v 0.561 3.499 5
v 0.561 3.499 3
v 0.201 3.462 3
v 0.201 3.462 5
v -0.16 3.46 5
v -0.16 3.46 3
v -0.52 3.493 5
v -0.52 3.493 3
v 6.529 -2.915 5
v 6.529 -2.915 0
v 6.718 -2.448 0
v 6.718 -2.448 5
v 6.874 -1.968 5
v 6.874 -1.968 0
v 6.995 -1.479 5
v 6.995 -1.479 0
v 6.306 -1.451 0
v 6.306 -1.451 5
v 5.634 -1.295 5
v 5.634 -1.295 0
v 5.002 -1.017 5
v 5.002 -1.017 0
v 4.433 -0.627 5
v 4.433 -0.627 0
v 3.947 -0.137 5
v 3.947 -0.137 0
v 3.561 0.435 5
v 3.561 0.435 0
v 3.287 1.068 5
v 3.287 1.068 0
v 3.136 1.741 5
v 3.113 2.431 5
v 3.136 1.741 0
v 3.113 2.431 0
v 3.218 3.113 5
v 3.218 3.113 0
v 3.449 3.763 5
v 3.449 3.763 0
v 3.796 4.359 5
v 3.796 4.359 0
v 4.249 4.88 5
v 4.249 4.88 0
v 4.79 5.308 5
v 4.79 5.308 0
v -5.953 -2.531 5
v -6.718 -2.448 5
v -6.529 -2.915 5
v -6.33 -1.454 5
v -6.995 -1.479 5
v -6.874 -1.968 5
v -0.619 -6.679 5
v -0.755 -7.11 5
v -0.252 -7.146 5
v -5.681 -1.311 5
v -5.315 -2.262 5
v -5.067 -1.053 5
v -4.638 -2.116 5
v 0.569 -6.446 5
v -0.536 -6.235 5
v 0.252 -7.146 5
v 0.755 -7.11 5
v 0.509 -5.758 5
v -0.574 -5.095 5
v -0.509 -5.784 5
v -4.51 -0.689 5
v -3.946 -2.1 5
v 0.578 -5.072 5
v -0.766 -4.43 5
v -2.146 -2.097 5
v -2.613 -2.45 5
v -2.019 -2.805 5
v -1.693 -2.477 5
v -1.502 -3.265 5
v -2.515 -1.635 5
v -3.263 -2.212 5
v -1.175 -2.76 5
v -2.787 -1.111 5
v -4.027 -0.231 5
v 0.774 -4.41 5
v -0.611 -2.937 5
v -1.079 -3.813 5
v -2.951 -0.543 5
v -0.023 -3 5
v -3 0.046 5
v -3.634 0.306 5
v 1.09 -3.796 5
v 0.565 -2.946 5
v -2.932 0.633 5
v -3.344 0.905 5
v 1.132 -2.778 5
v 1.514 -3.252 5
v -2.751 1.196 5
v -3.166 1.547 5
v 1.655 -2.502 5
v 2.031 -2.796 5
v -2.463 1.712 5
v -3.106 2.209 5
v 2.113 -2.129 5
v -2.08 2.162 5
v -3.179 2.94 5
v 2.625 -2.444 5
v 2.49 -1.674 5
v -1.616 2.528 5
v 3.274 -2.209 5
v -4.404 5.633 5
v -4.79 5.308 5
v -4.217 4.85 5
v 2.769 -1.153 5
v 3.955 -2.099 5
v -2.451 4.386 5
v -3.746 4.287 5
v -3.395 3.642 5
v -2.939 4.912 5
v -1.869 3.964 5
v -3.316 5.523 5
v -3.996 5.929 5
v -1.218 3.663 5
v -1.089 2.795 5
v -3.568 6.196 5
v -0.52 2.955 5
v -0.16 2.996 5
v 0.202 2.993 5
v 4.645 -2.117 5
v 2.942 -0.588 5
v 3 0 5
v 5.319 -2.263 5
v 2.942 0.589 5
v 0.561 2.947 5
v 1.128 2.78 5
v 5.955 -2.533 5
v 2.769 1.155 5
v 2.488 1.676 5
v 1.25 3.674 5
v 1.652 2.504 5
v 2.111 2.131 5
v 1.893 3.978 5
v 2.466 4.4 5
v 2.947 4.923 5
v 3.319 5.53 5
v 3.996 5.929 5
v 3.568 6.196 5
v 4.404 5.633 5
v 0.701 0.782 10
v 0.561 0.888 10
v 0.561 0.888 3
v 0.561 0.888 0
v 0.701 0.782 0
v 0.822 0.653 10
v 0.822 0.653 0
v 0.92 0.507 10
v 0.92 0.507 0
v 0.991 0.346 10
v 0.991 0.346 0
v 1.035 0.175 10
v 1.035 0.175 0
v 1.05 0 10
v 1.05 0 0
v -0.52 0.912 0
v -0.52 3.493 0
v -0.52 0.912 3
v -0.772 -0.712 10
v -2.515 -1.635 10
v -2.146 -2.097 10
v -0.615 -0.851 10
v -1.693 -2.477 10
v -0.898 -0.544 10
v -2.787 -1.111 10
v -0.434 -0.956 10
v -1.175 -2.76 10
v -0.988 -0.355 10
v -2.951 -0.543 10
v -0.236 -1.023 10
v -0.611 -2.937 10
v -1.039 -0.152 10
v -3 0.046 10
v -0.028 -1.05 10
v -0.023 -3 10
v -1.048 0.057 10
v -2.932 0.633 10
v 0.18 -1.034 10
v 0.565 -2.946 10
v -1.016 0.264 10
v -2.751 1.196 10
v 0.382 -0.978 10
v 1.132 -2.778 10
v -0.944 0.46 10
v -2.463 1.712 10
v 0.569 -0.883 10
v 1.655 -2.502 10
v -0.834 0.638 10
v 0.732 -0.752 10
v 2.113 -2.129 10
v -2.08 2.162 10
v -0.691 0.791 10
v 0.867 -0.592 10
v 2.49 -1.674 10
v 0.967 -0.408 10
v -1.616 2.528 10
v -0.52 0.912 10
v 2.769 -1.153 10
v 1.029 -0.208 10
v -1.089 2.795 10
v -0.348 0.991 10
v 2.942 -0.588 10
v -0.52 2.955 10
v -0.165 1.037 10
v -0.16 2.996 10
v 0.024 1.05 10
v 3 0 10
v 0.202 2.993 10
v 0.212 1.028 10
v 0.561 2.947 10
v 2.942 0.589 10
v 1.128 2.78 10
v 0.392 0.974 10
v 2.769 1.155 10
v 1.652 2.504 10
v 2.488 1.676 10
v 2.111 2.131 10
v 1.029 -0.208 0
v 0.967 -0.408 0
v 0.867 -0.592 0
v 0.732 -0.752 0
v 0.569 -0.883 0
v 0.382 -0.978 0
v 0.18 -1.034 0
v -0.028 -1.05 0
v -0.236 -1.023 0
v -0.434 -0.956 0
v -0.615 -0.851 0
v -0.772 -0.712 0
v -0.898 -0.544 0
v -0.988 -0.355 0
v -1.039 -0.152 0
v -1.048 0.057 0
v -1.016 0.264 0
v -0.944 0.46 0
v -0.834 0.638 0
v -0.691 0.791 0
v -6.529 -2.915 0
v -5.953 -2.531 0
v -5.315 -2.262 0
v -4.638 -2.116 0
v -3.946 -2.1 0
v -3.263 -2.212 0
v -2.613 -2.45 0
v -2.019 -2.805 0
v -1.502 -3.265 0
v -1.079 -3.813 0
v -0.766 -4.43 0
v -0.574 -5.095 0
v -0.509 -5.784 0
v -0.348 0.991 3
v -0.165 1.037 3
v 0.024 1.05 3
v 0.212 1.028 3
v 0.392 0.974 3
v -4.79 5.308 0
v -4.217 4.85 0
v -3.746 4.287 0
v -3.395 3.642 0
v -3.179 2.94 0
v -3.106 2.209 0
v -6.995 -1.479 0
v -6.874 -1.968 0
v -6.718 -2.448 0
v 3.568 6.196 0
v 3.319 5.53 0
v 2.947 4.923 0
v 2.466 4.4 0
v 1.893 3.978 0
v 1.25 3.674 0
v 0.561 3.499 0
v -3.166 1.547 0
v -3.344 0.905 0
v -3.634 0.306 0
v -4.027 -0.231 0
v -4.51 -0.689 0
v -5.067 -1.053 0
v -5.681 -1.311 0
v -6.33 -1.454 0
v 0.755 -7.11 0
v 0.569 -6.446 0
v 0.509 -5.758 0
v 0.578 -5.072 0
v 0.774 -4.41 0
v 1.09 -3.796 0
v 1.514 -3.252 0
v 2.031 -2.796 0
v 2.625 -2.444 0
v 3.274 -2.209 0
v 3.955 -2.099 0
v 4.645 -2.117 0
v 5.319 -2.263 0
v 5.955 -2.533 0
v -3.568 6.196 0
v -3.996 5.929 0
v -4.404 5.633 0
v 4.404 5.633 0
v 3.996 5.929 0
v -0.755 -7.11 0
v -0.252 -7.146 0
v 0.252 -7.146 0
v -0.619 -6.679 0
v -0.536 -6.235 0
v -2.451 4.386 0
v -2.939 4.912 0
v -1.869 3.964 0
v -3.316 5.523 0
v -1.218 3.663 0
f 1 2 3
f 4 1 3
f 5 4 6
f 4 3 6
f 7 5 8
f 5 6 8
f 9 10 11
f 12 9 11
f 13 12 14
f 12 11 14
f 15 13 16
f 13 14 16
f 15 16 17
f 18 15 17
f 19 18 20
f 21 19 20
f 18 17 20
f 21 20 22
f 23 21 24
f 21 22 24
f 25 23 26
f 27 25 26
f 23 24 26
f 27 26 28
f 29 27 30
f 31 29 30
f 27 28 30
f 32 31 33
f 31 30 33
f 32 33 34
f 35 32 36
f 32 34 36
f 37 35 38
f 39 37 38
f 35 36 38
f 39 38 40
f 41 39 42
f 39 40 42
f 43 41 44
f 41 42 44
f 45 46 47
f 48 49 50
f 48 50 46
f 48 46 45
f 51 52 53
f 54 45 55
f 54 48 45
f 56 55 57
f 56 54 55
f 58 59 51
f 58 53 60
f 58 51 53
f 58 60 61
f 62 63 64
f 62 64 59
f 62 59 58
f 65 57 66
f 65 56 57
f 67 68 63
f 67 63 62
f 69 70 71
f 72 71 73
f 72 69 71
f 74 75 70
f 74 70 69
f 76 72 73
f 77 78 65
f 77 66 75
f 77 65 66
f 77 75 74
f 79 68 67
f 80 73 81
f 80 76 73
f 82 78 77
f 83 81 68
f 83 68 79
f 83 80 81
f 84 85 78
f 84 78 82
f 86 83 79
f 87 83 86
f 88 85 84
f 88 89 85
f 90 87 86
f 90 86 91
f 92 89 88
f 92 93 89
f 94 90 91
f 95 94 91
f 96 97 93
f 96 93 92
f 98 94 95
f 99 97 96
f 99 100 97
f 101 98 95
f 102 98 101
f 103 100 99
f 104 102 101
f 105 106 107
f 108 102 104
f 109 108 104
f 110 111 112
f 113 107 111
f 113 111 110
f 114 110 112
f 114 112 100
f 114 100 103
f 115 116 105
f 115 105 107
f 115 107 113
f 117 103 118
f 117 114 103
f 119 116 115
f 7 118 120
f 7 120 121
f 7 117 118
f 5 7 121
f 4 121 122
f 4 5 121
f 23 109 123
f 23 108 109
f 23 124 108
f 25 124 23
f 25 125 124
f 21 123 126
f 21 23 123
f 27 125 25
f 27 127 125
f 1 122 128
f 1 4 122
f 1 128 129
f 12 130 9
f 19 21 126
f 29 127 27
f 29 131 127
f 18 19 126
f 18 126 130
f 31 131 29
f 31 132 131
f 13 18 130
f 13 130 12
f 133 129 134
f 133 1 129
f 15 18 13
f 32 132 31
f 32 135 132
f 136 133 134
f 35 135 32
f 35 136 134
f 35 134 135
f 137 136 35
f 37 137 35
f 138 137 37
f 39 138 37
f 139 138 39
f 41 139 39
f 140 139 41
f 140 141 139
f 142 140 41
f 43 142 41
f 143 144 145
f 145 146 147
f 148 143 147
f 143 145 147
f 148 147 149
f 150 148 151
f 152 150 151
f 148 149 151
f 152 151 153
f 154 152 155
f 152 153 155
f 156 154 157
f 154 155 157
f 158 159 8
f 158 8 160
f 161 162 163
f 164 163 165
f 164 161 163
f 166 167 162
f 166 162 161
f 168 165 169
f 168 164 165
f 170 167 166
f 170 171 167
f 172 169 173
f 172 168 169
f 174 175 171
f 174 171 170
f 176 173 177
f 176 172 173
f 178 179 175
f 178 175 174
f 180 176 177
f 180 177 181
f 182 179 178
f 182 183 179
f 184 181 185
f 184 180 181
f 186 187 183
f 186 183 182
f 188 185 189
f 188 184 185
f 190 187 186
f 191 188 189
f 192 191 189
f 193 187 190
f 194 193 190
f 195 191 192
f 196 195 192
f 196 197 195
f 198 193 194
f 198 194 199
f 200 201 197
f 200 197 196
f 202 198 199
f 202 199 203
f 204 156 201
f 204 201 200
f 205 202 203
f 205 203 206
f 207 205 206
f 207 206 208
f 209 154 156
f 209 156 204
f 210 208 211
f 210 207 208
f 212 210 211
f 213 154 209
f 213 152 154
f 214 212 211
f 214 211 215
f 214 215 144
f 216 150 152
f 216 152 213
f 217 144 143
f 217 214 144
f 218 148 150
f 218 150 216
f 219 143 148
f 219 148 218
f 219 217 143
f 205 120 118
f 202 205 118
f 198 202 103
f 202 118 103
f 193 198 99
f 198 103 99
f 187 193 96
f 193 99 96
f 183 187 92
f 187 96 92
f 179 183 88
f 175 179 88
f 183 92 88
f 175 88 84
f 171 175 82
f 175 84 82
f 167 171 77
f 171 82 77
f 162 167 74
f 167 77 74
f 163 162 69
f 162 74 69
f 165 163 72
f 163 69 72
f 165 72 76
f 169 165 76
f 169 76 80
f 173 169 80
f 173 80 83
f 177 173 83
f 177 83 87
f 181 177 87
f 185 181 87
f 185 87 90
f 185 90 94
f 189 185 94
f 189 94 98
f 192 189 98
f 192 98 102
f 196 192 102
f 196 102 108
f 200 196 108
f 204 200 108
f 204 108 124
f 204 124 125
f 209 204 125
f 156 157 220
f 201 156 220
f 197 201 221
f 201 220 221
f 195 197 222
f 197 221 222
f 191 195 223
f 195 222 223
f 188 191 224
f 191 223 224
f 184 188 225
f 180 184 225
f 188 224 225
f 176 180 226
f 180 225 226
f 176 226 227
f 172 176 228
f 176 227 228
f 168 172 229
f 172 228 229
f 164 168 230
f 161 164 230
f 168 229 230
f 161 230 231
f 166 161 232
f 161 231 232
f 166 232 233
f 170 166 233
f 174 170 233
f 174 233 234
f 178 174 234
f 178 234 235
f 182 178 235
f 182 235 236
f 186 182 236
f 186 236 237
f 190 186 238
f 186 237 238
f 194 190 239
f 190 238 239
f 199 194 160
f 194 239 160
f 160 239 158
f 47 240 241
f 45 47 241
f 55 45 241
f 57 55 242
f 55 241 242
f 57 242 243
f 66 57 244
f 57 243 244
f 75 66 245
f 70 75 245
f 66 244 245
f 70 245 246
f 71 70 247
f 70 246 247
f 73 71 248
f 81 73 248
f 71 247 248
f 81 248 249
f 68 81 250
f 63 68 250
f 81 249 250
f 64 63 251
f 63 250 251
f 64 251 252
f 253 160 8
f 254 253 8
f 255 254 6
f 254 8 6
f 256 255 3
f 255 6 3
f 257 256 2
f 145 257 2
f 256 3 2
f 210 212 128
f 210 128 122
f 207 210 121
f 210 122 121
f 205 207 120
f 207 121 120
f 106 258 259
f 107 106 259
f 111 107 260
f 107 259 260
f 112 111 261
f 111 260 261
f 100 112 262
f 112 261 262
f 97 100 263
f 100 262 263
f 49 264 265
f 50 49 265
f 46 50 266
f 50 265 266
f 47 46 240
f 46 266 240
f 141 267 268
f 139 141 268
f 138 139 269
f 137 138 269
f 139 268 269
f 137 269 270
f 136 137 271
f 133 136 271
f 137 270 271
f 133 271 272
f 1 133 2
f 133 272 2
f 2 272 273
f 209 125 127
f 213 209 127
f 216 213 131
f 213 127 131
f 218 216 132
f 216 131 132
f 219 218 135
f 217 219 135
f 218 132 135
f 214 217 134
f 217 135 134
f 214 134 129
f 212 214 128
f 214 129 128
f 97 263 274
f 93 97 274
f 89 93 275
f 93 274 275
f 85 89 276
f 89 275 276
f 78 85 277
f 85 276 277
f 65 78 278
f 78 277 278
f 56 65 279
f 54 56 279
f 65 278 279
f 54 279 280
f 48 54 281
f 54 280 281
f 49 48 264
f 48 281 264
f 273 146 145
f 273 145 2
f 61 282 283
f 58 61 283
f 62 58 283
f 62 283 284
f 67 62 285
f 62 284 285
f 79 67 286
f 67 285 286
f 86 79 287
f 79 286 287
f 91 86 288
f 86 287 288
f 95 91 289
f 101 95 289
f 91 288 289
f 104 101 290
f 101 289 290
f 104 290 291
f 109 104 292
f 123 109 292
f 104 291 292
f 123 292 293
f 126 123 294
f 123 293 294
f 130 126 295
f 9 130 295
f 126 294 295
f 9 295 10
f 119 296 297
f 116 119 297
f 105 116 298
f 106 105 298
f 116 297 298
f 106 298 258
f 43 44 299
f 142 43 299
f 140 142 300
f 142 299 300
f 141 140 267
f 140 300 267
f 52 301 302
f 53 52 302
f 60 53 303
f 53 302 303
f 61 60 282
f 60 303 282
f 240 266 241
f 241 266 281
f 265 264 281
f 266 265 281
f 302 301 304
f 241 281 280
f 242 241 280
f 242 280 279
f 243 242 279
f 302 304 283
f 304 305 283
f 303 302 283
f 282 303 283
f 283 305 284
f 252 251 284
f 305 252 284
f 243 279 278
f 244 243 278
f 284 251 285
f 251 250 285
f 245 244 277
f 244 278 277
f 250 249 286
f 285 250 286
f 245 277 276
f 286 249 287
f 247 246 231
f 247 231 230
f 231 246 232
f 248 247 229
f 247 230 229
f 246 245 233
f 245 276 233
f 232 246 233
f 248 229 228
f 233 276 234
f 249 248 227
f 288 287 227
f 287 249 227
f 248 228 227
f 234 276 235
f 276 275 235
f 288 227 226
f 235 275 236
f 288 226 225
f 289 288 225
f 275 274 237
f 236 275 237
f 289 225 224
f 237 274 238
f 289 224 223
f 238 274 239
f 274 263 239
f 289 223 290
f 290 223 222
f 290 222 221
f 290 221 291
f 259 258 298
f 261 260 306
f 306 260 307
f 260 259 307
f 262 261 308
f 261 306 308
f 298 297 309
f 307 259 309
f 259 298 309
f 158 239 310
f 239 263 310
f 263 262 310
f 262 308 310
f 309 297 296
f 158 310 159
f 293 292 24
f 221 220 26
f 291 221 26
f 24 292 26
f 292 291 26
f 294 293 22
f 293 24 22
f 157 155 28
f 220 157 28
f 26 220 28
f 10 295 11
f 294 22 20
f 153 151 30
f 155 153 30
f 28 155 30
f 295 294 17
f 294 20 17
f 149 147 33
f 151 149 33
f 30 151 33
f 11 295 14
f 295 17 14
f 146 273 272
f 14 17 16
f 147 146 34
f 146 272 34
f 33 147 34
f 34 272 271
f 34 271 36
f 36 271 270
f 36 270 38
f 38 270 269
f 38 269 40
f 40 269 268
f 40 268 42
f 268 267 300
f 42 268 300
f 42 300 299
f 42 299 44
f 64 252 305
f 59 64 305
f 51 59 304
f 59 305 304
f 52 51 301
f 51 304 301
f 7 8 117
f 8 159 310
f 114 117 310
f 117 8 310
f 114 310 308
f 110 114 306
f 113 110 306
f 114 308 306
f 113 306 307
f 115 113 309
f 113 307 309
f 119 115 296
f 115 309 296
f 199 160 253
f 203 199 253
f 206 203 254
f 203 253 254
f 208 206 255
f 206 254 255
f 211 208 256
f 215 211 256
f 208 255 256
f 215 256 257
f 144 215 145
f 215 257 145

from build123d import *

# Parameters (mm, degrees)
F1_DEPTH = 5
F2_DEPTH = 10
F3_DEPTH = 3


with BuildPart() as f1:
    # F0 (on Top) → F1 (new body)
    with BuildSketch(Plane.XY):
        with BuildLine():
            Line((0.560707187, 3.4989949035), (0.560707187, 2.9471354652))
            ThreePointArc((0.560707187, 2.9471354652), (2.3110735126, 1.9128353874), (3, 0))
            ThreePointArc((3, 0), (-1.9287498107, -2.2978085577), (-0.5199494453, 2.9545985471))
            Line((-0.5199494453, 2.9545985471), (-0.5199494453, 3.4929679604))
            ThreePointArc((-0.5199494453, 3.4929679604), (-2.4505424978, 4.3861128404), (-3.5684511747, 6.1958579885))
            ThreePointArc((-3.5684511747, 6.1958579885), (-4.2026645539, 5.7844715098), (-4.7898990575, 5.3084241559))
            ThreePointArc((-4.7898990575, 5.3084241559), (-3.5543368281, 3.9728631878), (-3.1062443016, 2.2094715098))
            ThreePointArc((-3.1062443016, 2.2094715098), (-4.2581115343, -0.4705954297), (-6.9953231706, -1.4791733296))
            ThreePointArc((-6.9953231706, -1.4791733296), (-6.8000540915, -2.2094715098), (-6.5287715949, -2.9150714334))
            ThreePointArc((-6.5287715949, -2.9150714334), (-2.6133197512, -2.450072934), (-0.508854764, -5.7844715098))
            ThreePointArc((-0.508854764, -5.7844715098), (-0.5708860042, -6.4585748626), (-0.754896307, -7.1100373814))
            ThreePointArc((-0.754896307, -7.1100373814), (0, -7.15), (0.754896307, -7.1100373814))
            ThreePointArc((0.754896307, -7.1100373814), (2.0314976346, -2.7961166157), (6.5287715949, -2.9150714334))
            ThreePointArc((6.5287715949, -2.9150714334), (6.8000540915, -2.2094715098), (6.9953231706, -1.4791733296))
            ThreePointArc((6.9953231706, -1.4791733296), (3.2870322209, 1.0680215107), (4.7898990575, 5.3084241559))
            ThreePointArc((4.7898990575, 5.3084241559), (4.2026645539, 5.7844715098), (3.5684511747, 6.1958579885))
            ThreePointArc((3.5684511747, 6.1958579885), (2.4659186562, 4.3998225611), (0.560707187, 3.4989949035))
        make_face()
        with BuildLine():
            ThreePointArc((-0.5199494453, 2.9545985471), (0.0207176923, 2.999928462), (0.560707187, 2.9471354652))
            Line((0.560707187, 2.9471354652), (0.560707187, 3.4989949035))
            ThreePointArc((0.560707187, 3.4989949035), (0.0206004706, 3.4562476552), (-0.5199494453, 3.4929679604))
            Line((-0.5199494453, 3.4929679604), (-0.5199494453, 2.9545985471))
        make_face()
    extrude(amount=F1_DEPTH)

    # F0 (on Top) → F2 (join)
    with BuildSketch(Plane.XY):
        with BuildLine():
            ThreePointArc((0.560707187, 0.887754161), (0.9195766815, 0.5068320499), (1.05, 0))
            ThreePointArc((1.05, 0), (-0.527519233, -0.9078675337), (-0.5199494453, 0.9122239716))
            Line((-0.5199494453, 0.9122239716), (-0.5199494453, 2.9545985471))
            ThreePointArc((-0.5199494453, 2.9545985471), (-1.9287498107, -2.2978085577), (3, 0))
            ThreePointArc((3, 0), (2.3110735126, 1.9128353874), (0.560707187, 2.9471354652))
            Line((0.560707187, 2.9471354652), (0.560707187, 0.887754161))
        make_face()
        with BuildLine():
            ThreePointArc((-0.5199494453, 0.9122239716), (0.0237695453, 1.0497309221), (0.560707187, 0.887754161))
            Line((0.560707187, 0.887754161), (0.560707187, 2.9471354652))
            ThreePointArc((0.560707187, 2.9471354652), (0.0207176923, 2.999928462), (-0.5199494453, 2.9545985471))
            Line((-0.5199494453, 2.9545985471), (-0.5199494453, 0.9122239716))
        make_face()
    extrude(amount=F2_DEPTH)

    # F0 (on Top) → F3 (cut)
    with BuildSketch(Plane.XY):
        with BuildLine():
            ThreePointArc((-0.5199494453, 0.9122239716), (0.0237695453, 1.0497309221), (0.560707187, 0.887754161))
            Line((0.560707187, 0.887754161), (0.560707187, 2.9471354652))
            ThreePointArc((0.560707187, 2.9471354652), (0.0207176923, 2.999928462), (-0.5199494453, 2.9545985471))
            Line((-0.5199494453, 2.9545985471), (-0.5199494453, 0.9122239716))
        make_face()
        with BuildLine():
            ThreePointArc((-0.5199494453, 2.9545985471), (0.0207176923, 2.999928462), (0.560707187, 2.9471354652))
            Line((0.560707187, 2.9471354652), (0.560707187, 3.4989949035))
            ThreePointArc((0.560707187, 3.4989949035), (0.0206004706, 3.4562476552), (-0.5199494453, 3.4929679604))
            Line((-0.5199494453, 3.4929679604), (-0.5199494453, 2.9545985471))
        make_face()
    extrude(amount=F3_DEPTH, mode=Mode.SUBTRACT)


solid = f1.part
